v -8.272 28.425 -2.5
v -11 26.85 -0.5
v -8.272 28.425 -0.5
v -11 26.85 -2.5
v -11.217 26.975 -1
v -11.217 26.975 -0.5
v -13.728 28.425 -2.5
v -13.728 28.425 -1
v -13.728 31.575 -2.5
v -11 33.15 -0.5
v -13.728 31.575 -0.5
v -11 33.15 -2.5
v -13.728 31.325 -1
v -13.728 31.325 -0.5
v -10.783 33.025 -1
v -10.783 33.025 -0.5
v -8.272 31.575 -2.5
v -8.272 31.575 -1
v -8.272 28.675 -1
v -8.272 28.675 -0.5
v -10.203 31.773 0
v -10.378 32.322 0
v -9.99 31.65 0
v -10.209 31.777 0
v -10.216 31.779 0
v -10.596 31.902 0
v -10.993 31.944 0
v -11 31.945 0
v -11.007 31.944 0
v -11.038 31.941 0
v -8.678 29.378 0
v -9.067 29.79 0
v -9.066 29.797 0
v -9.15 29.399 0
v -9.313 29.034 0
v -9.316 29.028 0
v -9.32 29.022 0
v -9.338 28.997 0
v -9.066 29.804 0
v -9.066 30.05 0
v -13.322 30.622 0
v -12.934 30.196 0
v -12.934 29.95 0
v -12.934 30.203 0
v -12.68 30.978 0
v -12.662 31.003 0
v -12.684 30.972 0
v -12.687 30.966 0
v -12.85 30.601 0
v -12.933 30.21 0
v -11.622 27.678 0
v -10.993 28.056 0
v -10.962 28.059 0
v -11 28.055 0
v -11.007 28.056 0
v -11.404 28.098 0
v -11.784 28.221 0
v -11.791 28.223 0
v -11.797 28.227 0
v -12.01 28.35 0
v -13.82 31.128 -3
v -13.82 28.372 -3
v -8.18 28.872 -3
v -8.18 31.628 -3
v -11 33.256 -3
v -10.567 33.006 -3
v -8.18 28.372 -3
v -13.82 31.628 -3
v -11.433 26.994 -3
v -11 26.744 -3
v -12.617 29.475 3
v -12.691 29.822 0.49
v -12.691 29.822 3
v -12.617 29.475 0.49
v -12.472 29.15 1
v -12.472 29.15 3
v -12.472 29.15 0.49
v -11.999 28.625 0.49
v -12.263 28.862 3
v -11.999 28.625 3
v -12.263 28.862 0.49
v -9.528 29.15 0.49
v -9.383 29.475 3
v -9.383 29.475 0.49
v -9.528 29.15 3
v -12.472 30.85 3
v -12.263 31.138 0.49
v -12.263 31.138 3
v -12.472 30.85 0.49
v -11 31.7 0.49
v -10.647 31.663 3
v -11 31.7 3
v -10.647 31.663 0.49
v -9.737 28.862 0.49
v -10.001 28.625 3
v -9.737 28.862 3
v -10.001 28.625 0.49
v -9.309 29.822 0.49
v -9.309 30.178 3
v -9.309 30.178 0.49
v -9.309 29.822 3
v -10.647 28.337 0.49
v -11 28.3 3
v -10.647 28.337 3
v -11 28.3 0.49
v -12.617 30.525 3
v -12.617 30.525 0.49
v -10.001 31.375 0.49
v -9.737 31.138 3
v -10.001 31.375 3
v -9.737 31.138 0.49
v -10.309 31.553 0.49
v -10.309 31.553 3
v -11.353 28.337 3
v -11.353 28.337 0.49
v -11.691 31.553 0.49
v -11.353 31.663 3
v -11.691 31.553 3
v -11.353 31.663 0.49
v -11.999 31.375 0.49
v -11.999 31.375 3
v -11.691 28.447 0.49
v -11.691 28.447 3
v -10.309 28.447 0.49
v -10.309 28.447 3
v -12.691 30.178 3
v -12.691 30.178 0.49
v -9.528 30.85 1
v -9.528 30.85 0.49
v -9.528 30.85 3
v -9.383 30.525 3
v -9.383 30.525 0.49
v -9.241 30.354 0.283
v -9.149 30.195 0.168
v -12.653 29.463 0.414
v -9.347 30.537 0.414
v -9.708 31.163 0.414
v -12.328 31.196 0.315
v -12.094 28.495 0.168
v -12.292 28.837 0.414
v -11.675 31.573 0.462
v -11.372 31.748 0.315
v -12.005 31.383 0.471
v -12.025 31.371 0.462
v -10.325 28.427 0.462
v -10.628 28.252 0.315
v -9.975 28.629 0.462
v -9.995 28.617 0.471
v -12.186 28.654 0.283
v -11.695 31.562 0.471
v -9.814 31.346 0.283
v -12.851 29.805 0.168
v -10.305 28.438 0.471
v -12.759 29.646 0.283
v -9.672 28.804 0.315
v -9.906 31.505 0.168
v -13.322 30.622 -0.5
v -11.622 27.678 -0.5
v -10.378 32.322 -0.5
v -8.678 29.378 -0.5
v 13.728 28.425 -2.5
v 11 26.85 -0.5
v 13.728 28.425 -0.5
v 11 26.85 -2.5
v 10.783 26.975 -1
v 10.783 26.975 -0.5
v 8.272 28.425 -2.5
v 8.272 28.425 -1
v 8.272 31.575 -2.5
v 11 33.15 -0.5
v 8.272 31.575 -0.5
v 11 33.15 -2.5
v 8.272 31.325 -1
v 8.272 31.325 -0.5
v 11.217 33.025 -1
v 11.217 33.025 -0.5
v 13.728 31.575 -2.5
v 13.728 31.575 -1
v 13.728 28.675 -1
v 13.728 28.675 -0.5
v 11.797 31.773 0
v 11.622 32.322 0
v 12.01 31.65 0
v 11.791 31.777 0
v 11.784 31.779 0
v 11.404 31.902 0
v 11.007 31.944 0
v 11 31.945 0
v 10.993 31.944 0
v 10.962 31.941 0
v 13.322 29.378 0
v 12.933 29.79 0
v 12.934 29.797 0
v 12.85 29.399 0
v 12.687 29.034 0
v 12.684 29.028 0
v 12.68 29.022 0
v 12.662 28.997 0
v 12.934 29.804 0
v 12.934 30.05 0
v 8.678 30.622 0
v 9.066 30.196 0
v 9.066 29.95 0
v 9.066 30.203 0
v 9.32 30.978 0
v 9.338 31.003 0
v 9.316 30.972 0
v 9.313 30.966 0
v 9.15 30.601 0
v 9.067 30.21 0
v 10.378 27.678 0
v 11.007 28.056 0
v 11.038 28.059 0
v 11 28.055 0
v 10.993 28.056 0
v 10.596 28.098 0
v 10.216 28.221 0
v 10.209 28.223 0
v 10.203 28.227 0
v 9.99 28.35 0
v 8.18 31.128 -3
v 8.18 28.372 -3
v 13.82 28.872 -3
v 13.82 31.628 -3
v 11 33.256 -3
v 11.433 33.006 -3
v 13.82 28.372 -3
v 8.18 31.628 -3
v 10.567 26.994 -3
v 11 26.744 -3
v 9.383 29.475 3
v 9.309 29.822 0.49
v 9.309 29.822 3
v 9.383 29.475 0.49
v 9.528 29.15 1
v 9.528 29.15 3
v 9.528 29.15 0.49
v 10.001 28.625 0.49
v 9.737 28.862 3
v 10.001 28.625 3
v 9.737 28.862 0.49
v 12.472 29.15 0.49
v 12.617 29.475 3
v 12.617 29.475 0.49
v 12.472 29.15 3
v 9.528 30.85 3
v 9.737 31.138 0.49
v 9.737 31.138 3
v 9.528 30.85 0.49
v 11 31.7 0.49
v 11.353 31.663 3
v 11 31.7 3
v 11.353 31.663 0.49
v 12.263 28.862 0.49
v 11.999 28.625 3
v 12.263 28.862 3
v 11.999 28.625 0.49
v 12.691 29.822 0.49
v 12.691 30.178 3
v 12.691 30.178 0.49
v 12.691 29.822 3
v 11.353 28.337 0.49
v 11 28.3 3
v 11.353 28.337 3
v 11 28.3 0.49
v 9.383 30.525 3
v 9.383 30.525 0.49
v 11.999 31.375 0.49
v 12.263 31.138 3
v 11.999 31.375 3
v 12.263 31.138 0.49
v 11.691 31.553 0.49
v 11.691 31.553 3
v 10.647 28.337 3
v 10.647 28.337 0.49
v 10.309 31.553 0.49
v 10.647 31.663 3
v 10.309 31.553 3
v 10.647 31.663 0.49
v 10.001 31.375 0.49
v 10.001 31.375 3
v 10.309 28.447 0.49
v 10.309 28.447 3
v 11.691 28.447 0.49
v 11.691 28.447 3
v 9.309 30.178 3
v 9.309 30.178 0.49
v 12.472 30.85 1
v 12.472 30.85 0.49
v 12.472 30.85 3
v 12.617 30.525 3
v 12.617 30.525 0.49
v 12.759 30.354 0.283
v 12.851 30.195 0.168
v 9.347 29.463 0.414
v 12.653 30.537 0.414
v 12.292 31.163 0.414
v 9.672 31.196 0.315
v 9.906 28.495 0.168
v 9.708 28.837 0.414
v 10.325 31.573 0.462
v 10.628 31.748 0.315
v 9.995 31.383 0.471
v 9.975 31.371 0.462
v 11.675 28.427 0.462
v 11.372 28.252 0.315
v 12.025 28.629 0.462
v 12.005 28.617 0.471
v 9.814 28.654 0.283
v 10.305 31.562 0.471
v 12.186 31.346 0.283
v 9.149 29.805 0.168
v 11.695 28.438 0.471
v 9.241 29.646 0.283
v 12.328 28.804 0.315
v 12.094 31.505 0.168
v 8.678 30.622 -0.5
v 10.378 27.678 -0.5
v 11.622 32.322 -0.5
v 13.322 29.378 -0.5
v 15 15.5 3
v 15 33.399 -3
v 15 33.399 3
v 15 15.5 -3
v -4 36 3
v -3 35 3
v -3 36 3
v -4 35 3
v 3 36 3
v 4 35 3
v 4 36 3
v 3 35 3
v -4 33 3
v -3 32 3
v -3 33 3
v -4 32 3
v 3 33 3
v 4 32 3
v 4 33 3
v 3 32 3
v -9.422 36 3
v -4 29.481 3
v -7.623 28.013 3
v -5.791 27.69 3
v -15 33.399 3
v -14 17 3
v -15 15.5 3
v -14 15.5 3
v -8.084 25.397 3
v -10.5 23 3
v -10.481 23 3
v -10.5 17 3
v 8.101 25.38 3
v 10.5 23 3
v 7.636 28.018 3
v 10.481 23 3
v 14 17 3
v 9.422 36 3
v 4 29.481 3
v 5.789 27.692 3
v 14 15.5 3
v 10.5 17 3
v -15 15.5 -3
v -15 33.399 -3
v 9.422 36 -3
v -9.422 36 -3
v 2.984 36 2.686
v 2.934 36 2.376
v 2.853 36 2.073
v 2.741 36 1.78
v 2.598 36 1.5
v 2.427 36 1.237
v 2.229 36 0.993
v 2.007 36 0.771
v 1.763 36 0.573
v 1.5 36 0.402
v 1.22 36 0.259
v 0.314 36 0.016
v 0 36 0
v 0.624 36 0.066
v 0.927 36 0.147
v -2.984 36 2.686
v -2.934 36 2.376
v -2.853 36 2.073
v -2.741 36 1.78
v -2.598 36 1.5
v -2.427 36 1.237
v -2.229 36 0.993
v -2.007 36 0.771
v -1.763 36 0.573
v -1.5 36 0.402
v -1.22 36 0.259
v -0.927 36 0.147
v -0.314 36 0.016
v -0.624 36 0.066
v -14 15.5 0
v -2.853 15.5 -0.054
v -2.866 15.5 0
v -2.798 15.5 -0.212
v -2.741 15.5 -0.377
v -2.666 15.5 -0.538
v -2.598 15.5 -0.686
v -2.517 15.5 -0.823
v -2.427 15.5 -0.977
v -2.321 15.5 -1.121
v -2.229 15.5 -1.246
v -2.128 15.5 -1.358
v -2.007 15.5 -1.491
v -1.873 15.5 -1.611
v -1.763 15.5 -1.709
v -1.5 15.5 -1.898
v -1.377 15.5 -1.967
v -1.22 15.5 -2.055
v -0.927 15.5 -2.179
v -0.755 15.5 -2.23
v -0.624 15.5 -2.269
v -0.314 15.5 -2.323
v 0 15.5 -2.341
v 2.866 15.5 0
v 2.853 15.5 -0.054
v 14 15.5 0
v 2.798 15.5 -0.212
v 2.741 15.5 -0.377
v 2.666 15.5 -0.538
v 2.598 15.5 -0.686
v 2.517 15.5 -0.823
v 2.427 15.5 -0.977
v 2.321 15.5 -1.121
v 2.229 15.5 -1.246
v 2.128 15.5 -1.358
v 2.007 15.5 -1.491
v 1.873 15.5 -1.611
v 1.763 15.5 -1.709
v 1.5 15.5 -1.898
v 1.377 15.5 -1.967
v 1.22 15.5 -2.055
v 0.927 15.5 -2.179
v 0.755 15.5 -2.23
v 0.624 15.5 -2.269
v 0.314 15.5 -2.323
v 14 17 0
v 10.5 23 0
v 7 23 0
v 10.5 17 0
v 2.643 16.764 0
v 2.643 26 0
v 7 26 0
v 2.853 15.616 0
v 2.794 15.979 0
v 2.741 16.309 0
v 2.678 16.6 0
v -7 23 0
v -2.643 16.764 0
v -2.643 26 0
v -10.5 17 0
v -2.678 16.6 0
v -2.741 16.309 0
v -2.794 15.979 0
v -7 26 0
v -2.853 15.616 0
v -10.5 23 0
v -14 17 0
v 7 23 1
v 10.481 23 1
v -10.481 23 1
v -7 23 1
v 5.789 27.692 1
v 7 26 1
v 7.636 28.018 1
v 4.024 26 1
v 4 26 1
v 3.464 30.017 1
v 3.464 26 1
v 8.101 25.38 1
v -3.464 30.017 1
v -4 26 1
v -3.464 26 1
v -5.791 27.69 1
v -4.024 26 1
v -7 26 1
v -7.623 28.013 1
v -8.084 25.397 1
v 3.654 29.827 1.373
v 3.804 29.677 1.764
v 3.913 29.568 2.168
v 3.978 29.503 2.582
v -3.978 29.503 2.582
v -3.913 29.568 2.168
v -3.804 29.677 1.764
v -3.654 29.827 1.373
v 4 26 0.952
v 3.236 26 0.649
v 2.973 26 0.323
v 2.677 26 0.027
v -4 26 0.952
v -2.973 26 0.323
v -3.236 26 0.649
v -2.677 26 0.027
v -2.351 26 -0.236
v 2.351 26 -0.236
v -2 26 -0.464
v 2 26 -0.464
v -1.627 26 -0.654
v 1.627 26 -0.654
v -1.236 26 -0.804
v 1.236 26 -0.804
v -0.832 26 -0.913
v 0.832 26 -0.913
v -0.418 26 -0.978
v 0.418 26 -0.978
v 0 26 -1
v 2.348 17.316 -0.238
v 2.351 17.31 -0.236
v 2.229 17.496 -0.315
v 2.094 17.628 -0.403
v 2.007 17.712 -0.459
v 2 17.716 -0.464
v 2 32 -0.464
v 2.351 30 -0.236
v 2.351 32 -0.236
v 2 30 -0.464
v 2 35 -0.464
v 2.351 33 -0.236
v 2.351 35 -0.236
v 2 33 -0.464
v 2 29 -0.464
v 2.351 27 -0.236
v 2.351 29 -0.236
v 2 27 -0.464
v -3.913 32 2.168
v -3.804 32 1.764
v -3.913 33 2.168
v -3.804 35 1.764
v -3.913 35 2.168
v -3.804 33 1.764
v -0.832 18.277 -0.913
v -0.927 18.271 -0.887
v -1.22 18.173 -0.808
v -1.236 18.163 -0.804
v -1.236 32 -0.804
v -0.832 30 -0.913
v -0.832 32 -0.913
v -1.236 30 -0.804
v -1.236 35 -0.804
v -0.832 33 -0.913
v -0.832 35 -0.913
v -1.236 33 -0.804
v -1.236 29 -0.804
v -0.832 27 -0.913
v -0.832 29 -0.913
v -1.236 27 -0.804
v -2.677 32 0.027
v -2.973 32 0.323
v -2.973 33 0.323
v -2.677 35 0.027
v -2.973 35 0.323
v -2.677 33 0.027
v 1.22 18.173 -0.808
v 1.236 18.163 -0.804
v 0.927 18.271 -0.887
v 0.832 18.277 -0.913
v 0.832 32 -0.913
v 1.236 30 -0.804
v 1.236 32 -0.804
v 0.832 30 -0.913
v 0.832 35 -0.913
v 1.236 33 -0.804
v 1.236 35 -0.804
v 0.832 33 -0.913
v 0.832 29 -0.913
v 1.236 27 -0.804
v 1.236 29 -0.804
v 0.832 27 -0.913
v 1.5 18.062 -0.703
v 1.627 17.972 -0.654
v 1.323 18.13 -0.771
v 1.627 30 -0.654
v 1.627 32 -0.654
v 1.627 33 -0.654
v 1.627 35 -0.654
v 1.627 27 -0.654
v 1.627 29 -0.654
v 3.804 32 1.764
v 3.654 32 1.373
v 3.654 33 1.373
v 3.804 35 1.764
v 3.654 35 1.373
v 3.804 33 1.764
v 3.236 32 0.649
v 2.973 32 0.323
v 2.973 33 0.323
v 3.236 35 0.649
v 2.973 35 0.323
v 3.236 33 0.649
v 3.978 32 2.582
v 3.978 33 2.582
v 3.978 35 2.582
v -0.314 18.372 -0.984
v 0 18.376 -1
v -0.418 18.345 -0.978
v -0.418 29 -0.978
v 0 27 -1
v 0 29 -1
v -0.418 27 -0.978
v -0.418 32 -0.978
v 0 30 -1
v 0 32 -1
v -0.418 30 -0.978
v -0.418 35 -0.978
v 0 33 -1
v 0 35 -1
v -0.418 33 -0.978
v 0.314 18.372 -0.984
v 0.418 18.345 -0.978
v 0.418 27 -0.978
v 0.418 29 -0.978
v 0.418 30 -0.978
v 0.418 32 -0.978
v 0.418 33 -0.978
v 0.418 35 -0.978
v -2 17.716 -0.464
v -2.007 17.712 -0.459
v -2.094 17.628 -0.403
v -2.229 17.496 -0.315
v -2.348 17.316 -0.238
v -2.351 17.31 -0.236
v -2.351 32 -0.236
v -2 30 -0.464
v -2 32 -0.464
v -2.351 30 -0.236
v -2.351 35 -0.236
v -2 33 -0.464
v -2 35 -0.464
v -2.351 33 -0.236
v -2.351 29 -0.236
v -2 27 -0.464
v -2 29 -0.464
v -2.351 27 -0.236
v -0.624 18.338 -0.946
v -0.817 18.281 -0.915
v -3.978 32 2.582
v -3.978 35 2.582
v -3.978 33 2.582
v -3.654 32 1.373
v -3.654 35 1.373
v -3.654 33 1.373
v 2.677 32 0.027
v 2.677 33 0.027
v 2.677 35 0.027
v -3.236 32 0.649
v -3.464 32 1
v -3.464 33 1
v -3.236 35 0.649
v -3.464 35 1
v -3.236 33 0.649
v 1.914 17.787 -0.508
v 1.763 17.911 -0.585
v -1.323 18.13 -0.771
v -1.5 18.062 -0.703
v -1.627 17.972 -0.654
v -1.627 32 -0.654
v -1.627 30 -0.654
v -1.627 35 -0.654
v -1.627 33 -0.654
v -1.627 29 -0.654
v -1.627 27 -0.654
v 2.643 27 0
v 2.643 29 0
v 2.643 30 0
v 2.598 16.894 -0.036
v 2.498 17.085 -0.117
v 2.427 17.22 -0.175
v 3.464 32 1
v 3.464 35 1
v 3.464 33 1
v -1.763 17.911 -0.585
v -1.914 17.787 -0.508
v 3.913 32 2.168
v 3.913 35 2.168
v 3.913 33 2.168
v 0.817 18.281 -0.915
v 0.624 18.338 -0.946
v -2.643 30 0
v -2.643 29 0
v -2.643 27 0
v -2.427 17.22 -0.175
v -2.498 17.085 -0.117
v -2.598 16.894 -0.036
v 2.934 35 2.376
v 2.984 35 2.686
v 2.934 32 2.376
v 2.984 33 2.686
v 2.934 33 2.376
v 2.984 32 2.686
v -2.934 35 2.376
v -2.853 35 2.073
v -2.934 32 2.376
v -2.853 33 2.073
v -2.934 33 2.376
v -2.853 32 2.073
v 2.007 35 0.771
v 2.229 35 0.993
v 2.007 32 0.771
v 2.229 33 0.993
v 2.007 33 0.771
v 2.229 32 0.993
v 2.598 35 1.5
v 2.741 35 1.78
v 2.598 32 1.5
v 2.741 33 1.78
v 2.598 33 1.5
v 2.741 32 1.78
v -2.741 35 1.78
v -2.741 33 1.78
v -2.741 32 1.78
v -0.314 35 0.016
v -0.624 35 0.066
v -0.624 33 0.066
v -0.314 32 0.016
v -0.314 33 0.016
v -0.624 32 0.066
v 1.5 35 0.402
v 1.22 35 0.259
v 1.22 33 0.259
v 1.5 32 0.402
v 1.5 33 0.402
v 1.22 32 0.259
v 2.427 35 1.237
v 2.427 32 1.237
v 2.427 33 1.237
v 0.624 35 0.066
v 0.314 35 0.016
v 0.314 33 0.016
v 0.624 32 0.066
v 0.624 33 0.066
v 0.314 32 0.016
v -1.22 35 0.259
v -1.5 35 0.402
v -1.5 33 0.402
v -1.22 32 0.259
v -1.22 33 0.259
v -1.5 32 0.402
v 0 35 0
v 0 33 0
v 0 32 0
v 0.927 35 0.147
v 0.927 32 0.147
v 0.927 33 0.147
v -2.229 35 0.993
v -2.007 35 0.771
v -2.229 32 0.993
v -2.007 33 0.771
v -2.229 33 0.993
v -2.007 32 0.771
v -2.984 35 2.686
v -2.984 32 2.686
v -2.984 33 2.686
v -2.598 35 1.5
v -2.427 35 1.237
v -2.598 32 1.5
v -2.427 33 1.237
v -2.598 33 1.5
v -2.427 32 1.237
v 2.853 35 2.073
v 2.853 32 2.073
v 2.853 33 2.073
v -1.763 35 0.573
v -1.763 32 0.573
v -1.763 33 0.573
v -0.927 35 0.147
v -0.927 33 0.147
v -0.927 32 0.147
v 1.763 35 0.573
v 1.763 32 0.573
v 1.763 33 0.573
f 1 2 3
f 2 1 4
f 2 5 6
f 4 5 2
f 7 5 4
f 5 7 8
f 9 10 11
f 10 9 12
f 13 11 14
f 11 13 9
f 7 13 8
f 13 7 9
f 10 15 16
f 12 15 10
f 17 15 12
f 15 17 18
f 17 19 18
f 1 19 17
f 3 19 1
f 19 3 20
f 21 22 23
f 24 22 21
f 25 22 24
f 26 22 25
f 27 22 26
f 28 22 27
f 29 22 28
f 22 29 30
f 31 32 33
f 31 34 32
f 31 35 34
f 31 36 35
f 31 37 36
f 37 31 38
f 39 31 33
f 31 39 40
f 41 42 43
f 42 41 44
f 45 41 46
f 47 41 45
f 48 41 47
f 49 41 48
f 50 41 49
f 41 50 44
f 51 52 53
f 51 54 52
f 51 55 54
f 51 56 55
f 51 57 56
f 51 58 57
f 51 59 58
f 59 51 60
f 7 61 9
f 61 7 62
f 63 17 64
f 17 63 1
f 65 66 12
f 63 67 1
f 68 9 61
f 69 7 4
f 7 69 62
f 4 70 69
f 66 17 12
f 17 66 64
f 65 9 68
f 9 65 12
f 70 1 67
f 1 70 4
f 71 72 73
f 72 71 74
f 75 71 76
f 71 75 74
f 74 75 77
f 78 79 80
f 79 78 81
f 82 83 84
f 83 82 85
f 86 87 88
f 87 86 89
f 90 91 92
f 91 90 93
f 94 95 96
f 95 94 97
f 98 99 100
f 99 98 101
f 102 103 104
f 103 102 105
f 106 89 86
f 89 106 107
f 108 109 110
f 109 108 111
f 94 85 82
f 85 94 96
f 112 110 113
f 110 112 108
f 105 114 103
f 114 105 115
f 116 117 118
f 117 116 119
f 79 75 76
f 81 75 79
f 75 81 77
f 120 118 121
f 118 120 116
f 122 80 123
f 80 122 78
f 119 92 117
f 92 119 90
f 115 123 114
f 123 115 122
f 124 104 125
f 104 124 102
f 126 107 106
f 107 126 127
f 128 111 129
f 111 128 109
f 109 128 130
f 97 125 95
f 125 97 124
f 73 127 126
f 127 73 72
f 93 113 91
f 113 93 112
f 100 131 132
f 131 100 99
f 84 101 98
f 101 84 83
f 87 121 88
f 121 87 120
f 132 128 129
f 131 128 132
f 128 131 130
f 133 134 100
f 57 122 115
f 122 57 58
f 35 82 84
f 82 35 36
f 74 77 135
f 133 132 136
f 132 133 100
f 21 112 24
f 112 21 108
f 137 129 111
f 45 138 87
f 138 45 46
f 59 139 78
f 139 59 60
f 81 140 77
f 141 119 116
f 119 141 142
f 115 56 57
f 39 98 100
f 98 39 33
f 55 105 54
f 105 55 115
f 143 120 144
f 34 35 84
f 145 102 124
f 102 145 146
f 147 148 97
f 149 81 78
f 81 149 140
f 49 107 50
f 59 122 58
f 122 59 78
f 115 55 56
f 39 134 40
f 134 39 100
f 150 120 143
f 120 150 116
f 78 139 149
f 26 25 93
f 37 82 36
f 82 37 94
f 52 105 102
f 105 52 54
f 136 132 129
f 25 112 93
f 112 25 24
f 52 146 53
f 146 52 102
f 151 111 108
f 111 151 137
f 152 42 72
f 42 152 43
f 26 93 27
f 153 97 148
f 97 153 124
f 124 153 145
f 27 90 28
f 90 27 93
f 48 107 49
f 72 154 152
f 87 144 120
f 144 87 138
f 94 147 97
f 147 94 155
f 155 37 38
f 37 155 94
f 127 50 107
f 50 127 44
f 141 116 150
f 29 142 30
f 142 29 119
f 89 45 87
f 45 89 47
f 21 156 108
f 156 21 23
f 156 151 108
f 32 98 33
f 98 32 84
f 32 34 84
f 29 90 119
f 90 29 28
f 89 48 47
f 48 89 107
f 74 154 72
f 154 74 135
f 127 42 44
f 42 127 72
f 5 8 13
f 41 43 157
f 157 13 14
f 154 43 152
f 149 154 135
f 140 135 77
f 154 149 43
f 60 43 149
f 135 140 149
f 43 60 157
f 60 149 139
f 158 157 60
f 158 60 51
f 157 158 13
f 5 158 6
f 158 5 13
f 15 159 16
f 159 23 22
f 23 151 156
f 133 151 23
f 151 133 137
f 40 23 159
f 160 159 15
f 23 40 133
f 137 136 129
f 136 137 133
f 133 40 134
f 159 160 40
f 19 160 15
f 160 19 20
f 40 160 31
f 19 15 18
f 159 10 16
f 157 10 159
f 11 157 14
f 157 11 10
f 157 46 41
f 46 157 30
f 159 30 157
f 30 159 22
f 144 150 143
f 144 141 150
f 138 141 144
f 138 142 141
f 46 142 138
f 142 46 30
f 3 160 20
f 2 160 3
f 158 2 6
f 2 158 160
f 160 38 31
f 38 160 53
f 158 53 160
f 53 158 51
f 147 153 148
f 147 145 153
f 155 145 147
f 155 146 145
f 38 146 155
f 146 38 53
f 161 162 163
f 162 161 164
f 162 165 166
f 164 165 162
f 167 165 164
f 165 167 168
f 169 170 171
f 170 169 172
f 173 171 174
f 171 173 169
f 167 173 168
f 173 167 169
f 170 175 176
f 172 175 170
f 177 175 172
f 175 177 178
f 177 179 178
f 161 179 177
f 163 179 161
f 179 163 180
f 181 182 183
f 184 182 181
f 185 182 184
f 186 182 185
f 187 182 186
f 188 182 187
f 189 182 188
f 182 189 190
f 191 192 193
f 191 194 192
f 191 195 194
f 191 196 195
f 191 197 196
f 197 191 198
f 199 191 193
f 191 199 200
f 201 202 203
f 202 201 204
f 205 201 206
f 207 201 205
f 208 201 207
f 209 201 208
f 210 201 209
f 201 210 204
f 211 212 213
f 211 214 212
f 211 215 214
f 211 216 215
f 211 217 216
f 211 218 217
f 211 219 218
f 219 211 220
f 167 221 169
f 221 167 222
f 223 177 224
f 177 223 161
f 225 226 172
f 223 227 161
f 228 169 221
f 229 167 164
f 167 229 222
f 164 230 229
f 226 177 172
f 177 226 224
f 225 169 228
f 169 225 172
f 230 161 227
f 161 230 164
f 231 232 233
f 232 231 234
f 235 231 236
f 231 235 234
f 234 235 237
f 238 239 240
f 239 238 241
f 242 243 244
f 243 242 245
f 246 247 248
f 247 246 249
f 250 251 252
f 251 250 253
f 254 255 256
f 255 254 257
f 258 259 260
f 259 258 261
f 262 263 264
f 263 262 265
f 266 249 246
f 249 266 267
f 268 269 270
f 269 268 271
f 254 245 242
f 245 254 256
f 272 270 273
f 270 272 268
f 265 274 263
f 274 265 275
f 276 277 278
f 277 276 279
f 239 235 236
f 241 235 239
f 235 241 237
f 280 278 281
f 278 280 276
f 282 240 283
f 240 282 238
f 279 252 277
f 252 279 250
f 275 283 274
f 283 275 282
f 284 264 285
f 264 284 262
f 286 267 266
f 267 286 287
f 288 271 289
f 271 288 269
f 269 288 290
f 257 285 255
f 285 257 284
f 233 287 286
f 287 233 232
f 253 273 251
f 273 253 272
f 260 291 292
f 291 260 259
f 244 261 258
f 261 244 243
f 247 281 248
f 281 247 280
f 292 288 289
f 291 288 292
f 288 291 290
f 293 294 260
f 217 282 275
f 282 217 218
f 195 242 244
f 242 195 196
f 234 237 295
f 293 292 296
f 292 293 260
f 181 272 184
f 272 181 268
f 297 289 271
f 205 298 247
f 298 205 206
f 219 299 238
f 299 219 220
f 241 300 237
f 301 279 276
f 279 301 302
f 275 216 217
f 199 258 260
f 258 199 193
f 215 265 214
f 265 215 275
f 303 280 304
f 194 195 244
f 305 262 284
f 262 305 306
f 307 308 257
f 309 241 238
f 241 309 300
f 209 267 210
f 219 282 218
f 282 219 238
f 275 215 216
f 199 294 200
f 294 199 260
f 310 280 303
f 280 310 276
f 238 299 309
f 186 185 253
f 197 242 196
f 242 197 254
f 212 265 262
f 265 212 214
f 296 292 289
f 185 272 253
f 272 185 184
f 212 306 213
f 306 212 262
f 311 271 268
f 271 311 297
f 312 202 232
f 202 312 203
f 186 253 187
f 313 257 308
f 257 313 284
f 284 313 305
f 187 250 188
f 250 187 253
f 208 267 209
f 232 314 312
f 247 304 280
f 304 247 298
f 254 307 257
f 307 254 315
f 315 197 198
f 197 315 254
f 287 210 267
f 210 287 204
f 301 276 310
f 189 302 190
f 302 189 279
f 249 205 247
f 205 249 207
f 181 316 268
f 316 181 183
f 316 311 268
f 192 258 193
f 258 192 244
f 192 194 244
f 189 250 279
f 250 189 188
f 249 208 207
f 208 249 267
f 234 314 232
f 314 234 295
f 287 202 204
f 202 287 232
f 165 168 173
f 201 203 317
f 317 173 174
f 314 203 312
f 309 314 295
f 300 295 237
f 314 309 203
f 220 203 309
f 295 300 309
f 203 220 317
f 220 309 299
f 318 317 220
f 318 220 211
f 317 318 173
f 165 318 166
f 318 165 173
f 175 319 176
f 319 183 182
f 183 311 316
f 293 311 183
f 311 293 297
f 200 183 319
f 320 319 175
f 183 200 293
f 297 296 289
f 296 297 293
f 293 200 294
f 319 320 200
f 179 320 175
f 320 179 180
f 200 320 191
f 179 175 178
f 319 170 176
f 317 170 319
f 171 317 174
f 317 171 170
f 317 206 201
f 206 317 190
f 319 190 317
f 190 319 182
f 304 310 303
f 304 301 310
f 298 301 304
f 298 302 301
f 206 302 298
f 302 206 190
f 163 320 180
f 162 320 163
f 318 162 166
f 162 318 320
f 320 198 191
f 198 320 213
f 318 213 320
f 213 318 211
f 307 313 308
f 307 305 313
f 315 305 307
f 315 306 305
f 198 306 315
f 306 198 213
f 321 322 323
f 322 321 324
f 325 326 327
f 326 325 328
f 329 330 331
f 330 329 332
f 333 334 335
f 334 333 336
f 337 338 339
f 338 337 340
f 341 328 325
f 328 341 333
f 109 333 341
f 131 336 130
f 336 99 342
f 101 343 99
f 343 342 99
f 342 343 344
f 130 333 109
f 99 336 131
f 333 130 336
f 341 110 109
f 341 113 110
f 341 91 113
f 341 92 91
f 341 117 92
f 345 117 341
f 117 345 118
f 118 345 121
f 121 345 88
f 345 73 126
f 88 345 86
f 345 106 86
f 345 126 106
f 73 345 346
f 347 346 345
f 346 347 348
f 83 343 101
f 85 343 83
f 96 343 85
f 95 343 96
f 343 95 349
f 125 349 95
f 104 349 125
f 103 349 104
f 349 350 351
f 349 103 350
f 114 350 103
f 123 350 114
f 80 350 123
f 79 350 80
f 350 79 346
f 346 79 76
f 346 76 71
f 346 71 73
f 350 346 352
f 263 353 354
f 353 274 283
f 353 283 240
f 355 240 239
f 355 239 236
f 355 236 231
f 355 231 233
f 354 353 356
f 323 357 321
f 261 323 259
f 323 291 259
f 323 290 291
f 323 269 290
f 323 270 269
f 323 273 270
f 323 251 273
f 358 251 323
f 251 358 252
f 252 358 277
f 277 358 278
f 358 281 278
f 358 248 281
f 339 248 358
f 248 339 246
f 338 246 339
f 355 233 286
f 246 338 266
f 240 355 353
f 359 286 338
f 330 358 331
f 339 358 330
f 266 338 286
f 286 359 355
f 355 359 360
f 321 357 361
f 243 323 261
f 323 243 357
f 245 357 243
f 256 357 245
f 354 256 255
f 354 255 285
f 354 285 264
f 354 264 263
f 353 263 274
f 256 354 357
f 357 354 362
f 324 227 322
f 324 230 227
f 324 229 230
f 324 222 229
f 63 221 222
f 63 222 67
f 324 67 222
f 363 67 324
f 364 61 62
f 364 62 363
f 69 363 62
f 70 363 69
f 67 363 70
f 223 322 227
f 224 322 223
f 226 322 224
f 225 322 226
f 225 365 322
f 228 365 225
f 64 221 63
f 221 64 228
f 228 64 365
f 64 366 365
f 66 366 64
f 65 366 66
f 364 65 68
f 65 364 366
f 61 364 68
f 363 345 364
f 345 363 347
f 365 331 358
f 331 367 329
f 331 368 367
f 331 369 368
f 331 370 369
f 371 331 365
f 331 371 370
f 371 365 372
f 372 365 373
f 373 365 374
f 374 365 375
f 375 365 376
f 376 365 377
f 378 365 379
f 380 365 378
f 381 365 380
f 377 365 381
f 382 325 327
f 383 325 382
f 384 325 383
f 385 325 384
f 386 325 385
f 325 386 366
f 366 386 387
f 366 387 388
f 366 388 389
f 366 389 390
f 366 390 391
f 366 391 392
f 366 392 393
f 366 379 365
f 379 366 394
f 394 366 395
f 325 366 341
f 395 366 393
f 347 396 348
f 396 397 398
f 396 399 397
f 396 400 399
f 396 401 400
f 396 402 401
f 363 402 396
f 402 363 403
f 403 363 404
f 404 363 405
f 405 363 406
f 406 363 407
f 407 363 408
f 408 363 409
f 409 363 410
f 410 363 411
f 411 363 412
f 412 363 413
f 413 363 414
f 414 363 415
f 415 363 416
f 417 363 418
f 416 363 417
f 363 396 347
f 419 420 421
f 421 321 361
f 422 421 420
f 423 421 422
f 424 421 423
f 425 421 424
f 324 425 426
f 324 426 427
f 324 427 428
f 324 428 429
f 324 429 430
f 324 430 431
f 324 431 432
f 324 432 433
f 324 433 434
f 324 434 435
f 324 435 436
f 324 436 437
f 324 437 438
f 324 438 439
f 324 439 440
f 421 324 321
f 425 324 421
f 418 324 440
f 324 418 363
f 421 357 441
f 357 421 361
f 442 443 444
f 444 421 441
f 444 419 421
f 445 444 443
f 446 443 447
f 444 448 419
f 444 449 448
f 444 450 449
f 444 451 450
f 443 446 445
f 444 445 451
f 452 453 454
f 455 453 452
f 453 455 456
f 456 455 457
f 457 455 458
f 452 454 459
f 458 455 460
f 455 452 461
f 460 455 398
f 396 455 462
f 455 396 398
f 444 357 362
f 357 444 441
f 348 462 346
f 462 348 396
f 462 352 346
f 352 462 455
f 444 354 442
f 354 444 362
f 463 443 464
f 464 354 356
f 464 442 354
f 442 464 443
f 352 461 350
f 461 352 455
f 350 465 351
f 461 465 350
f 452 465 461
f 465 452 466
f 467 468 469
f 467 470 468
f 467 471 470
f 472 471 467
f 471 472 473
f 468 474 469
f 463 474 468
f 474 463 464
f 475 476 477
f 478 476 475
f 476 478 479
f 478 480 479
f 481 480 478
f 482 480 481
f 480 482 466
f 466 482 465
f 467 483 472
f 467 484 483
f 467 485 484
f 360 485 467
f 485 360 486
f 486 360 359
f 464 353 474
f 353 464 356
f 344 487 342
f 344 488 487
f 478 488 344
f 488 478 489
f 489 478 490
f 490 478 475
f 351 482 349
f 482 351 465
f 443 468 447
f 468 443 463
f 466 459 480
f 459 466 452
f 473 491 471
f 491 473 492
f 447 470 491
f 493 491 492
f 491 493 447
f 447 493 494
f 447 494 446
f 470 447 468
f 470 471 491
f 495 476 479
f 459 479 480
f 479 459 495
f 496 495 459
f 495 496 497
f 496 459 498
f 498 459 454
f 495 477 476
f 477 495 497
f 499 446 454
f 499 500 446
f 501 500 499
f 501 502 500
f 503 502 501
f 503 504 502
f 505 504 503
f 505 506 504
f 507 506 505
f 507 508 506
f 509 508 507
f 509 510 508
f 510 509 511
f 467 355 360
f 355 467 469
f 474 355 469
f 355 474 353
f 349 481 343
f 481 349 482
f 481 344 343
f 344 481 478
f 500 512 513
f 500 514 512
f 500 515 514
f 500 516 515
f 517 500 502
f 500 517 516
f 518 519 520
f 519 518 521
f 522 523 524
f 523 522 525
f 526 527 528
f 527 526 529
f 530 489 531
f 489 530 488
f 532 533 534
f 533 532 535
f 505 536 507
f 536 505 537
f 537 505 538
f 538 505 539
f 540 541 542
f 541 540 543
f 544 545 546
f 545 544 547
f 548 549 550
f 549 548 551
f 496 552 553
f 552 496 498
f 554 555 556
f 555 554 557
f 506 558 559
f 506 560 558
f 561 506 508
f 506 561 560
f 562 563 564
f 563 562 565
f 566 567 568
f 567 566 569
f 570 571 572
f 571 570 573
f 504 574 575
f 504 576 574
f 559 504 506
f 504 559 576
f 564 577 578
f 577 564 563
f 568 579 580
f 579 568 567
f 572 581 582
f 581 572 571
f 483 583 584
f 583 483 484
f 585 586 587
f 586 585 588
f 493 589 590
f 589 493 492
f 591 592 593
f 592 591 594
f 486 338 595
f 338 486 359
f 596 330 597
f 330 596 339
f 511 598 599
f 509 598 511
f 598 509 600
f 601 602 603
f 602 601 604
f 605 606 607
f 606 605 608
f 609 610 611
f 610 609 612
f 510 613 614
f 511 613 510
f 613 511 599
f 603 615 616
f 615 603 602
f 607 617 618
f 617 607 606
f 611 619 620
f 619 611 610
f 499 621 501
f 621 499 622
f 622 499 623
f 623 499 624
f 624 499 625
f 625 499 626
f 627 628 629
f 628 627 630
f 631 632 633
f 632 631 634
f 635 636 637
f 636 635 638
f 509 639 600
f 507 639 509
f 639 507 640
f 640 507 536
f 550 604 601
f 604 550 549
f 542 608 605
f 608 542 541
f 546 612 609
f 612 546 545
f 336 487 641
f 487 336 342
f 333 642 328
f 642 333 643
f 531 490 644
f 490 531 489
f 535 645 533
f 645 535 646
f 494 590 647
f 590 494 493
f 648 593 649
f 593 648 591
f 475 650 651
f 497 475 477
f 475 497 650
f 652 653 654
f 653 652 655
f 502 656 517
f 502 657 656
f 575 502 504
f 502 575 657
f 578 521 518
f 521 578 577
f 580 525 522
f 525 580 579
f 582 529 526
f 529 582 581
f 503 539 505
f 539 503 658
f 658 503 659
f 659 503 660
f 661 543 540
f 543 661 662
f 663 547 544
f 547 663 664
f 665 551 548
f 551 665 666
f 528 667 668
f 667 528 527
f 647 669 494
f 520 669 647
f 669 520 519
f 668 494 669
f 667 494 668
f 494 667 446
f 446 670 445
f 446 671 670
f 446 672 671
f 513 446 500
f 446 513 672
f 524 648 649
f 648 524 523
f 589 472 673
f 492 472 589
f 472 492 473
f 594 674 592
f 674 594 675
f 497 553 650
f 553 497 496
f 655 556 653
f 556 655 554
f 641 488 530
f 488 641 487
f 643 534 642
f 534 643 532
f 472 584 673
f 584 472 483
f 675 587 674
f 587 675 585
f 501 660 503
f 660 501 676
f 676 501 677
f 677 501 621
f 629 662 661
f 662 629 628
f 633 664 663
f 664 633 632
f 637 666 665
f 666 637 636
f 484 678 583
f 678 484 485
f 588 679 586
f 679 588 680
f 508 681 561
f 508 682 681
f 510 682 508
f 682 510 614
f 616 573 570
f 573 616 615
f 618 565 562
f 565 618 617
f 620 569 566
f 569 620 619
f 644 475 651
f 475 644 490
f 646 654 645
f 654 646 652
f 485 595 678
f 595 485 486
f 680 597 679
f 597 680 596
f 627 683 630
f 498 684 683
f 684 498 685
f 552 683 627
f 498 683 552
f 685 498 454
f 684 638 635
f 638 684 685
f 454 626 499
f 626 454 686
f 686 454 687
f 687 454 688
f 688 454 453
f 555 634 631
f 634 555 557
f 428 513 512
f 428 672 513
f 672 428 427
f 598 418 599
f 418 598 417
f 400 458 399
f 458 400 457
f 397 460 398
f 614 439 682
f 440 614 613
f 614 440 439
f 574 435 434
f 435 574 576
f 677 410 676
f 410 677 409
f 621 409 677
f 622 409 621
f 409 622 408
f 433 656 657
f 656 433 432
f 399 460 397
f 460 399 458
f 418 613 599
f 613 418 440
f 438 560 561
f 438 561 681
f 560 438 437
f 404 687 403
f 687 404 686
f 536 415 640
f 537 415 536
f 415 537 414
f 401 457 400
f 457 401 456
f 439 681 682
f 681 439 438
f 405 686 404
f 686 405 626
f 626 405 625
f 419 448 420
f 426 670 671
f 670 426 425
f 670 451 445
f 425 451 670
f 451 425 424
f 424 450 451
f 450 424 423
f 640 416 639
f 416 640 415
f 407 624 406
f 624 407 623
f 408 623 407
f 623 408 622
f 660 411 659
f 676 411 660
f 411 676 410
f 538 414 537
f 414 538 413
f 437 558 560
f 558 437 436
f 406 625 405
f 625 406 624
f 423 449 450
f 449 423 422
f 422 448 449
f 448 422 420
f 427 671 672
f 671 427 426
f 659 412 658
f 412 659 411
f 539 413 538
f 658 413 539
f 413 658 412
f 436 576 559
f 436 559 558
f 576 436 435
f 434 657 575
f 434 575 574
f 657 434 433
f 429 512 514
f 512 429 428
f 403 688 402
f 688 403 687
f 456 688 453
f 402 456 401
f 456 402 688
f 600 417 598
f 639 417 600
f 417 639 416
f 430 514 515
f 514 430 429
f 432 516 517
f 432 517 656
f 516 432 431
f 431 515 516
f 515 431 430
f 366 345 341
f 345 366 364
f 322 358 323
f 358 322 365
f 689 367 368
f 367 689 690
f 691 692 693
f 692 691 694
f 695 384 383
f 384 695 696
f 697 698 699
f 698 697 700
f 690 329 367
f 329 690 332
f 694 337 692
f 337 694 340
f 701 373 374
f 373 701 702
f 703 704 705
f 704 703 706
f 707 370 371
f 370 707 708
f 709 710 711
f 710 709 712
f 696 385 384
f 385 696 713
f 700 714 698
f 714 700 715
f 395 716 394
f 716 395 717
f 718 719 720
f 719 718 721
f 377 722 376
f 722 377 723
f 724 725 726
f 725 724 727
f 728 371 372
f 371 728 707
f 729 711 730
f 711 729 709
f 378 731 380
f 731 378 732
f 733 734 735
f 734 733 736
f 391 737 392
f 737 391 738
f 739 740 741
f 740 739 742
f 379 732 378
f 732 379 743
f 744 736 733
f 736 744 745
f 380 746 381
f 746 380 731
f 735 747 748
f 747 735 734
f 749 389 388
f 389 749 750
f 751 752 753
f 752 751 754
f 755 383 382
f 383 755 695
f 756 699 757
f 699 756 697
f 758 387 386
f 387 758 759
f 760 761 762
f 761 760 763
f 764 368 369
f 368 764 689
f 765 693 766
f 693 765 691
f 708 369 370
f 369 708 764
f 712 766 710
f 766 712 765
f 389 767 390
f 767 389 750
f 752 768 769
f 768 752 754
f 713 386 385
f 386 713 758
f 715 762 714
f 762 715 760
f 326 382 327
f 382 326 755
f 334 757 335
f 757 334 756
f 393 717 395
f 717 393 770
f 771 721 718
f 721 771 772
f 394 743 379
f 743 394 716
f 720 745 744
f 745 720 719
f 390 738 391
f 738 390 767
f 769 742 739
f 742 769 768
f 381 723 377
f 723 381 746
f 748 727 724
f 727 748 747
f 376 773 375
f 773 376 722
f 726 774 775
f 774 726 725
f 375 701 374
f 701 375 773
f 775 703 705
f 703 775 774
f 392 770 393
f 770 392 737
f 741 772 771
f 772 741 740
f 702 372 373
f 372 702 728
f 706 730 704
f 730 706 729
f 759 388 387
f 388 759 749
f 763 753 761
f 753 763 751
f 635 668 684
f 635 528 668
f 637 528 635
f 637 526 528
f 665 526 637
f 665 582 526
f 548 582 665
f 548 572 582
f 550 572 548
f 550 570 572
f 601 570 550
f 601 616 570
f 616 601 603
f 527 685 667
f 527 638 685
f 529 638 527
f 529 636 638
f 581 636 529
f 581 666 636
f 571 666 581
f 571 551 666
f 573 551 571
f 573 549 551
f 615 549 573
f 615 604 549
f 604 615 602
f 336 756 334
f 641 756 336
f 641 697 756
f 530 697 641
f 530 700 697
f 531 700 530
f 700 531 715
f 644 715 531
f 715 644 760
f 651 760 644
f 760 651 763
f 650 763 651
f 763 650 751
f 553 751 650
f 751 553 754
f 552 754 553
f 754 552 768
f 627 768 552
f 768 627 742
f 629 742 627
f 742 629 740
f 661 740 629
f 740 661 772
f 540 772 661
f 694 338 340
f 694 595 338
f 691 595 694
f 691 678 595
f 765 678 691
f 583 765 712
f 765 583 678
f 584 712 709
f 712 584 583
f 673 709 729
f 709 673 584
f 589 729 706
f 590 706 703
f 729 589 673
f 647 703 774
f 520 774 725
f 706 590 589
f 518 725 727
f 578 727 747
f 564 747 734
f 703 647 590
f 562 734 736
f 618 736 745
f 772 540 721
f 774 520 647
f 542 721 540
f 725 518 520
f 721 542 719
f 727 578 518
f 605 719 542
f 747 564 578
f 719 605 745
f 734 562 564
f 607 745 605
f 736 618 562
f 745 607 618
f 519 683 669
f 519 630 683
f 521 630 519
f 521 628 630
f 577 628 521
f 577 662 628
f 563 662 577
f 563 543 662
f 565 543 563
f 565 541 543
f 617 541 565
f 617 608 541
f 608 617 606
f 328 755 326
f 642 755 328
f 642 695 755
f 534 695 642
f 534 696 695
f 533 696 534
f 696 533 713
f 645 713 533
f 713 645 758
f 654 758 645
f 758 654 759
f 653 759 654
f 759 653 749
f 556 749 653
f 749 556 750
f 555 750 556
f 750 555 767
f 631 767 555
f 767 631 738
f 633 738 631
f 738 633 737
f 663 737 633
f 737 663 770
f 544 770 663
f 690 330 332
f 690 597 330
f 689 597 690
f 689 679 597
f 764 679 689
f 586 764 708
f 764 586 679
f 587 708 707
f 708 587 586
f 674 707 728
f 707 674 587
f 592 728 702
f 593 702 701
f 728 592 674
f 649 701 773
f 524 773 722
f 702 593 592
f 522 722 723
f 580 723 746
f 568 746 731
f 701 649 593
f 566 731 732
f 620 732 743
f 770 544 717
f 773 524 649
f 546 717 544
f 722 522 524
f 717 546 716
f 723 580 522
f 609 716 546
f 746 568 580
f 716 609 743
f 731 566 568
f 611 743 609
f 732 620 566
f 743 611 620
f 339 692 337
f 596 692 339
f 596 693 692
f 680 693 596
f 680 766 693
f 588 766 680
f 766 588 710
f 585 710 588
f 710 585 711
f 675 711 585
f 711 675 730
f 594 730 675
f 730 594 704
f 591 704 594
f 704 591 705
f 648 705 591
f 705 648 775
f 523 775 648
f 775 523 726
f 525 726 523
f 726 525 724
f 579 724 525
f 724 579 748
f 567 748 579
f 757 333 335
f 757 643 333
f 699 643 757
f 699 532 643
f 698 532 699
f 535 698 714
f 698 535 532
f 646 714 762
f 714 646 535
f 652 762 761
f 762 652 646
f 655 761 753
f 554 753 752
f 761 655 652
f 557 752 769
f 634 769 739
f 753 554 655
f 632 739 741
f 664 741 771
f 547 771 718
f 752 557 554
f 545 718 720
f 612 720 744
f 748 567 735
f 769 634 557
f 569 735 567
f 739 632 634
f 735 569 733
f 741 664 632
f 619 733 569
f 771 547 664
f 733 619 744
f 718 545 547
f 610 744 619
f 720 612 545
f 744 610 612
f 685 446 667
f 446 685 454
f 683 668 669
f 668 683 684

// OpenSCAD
// PRUSA iteration4
// Heatbed cable cover clip MK3S
// GNU GPL v3
// Josef Průša <iam@josefprusa.cz> and contributors
// http://www.reprap.org/wiki/Prusa_Mendel
// http://prusamendel.org


module m3_nut()
{
    difference()
    {
        union()
        {
            cylinder( h = 4, r = 3.15, $fn=6);  
            translate([0,0,2.5]) cylinder( h = 4, r1 = 3.15, r2=4,$fn=6);  
            translate([0,0,-9])  cylinder( h = 12, r = 1.7, $fn=30);  
            translate([0,0,-0.49]) cylinder( h = 0.5, r1 = 1.7, r2=1.95,$fn=30);  
        }
        translate([1.7,-5,-1]) cube([5,10,2]); 
        translate([-6.7,-5,-1]) cube([5,10,2]); 
        
        translate([-5,1.7,-1.5]) cube([10,5,2]); 
        translate([-5,-6.7,-1.5]) cube([10,5,2]); 
        
    }
}


module clip()
{
    
    difference()
    {
        // base body
        translate([-15,15.5,-3]) cube([30,20.5,6]); 
        
        // inner angled cut
        translate([3.5,2,0]) rotate([0,0,0])  cube([10.5,15,6]);
        translate([-14,2,0]) rotate([0,0,0])  cube([10.5,15,6]);
        
        translate([3.5,15,0]) rotate([0,0,0])  cube([7,8,6]);
        translate([-10.5,15,0]) rotate([0,0,0])  cube([7,8,6]);
       
        translate([6.96,19.45,1]) rotate([0,0,45])  cube([5,10,6]);
        translate([-6.96,19.45,1]) rotate([0,0,45])  cube([10,5,6]); 
        
        translate([-0,37,3]) rotate([90,0,0]) cylinder(h = 17, r=3.5, $fn=60);
            
        translate([-7,15,0]) rotate([0,0,0])  cube([14,11,6]);
       
        translate([3,14,1]) rotate([0,0,10])  cube([7,13,6]);
        translate([-9.88,15.21,1]) rotate([0,0,-10])  cube([7,13,6]); 
        
        // cables cut
        translate([-0,36,3]) rotate([90,0,0]) cylinder(h = 187, r=4, $fn=60); 
       
        translate([-11,30,0]) rotate([0,180,30]) m3_nut();
        translate([11,30,0]) rotate([0,180,30]) m3_nut();
       
        // thermistor cable entry
        translate([-0,22,4]) rotate([115,0,0]) cylinder(h = 15, r=3, $fn=60);     
    
    
        // edges  
        translate([-18.0,32,-5]) rotate([0,0,25])  cube([11,11,15]);
        translate([18,32,-5]) rotate([0,0,65])  cube([11,11,15]);
     
    }
    
    // cable rims
    difference()
    {
        difference()
        {
            translate([-0,36,3]) rotate([90,0,0]) cylinder(h = 10, r=4.5, $fn=60); 
            translate([-0,37,3]) rotate([90,0,0]) cylinder(h = 17, r=3, $fn=60);
            
        }
        translate([-15,18,3]) cube([30,20,6]);    
        translate([-15,27,-5]) cube([30,2,16]);    
        translate([-15,30,-5]) cube([30,2,16]);    
        translate([-15,33,-5]) cube([30,2,16]); 
        translate([6.96,19.45,1]) rotate([0,0,45])  cube([5,10,6]);
        translate([-6.96,19.45,1]) rotate([0,0,45])  cube([10,5,6]); 
        translate([-4,20,0]) rotate([0,0,0])  cube([8,11,6]); 
        
    }
       
}


  


clip();
